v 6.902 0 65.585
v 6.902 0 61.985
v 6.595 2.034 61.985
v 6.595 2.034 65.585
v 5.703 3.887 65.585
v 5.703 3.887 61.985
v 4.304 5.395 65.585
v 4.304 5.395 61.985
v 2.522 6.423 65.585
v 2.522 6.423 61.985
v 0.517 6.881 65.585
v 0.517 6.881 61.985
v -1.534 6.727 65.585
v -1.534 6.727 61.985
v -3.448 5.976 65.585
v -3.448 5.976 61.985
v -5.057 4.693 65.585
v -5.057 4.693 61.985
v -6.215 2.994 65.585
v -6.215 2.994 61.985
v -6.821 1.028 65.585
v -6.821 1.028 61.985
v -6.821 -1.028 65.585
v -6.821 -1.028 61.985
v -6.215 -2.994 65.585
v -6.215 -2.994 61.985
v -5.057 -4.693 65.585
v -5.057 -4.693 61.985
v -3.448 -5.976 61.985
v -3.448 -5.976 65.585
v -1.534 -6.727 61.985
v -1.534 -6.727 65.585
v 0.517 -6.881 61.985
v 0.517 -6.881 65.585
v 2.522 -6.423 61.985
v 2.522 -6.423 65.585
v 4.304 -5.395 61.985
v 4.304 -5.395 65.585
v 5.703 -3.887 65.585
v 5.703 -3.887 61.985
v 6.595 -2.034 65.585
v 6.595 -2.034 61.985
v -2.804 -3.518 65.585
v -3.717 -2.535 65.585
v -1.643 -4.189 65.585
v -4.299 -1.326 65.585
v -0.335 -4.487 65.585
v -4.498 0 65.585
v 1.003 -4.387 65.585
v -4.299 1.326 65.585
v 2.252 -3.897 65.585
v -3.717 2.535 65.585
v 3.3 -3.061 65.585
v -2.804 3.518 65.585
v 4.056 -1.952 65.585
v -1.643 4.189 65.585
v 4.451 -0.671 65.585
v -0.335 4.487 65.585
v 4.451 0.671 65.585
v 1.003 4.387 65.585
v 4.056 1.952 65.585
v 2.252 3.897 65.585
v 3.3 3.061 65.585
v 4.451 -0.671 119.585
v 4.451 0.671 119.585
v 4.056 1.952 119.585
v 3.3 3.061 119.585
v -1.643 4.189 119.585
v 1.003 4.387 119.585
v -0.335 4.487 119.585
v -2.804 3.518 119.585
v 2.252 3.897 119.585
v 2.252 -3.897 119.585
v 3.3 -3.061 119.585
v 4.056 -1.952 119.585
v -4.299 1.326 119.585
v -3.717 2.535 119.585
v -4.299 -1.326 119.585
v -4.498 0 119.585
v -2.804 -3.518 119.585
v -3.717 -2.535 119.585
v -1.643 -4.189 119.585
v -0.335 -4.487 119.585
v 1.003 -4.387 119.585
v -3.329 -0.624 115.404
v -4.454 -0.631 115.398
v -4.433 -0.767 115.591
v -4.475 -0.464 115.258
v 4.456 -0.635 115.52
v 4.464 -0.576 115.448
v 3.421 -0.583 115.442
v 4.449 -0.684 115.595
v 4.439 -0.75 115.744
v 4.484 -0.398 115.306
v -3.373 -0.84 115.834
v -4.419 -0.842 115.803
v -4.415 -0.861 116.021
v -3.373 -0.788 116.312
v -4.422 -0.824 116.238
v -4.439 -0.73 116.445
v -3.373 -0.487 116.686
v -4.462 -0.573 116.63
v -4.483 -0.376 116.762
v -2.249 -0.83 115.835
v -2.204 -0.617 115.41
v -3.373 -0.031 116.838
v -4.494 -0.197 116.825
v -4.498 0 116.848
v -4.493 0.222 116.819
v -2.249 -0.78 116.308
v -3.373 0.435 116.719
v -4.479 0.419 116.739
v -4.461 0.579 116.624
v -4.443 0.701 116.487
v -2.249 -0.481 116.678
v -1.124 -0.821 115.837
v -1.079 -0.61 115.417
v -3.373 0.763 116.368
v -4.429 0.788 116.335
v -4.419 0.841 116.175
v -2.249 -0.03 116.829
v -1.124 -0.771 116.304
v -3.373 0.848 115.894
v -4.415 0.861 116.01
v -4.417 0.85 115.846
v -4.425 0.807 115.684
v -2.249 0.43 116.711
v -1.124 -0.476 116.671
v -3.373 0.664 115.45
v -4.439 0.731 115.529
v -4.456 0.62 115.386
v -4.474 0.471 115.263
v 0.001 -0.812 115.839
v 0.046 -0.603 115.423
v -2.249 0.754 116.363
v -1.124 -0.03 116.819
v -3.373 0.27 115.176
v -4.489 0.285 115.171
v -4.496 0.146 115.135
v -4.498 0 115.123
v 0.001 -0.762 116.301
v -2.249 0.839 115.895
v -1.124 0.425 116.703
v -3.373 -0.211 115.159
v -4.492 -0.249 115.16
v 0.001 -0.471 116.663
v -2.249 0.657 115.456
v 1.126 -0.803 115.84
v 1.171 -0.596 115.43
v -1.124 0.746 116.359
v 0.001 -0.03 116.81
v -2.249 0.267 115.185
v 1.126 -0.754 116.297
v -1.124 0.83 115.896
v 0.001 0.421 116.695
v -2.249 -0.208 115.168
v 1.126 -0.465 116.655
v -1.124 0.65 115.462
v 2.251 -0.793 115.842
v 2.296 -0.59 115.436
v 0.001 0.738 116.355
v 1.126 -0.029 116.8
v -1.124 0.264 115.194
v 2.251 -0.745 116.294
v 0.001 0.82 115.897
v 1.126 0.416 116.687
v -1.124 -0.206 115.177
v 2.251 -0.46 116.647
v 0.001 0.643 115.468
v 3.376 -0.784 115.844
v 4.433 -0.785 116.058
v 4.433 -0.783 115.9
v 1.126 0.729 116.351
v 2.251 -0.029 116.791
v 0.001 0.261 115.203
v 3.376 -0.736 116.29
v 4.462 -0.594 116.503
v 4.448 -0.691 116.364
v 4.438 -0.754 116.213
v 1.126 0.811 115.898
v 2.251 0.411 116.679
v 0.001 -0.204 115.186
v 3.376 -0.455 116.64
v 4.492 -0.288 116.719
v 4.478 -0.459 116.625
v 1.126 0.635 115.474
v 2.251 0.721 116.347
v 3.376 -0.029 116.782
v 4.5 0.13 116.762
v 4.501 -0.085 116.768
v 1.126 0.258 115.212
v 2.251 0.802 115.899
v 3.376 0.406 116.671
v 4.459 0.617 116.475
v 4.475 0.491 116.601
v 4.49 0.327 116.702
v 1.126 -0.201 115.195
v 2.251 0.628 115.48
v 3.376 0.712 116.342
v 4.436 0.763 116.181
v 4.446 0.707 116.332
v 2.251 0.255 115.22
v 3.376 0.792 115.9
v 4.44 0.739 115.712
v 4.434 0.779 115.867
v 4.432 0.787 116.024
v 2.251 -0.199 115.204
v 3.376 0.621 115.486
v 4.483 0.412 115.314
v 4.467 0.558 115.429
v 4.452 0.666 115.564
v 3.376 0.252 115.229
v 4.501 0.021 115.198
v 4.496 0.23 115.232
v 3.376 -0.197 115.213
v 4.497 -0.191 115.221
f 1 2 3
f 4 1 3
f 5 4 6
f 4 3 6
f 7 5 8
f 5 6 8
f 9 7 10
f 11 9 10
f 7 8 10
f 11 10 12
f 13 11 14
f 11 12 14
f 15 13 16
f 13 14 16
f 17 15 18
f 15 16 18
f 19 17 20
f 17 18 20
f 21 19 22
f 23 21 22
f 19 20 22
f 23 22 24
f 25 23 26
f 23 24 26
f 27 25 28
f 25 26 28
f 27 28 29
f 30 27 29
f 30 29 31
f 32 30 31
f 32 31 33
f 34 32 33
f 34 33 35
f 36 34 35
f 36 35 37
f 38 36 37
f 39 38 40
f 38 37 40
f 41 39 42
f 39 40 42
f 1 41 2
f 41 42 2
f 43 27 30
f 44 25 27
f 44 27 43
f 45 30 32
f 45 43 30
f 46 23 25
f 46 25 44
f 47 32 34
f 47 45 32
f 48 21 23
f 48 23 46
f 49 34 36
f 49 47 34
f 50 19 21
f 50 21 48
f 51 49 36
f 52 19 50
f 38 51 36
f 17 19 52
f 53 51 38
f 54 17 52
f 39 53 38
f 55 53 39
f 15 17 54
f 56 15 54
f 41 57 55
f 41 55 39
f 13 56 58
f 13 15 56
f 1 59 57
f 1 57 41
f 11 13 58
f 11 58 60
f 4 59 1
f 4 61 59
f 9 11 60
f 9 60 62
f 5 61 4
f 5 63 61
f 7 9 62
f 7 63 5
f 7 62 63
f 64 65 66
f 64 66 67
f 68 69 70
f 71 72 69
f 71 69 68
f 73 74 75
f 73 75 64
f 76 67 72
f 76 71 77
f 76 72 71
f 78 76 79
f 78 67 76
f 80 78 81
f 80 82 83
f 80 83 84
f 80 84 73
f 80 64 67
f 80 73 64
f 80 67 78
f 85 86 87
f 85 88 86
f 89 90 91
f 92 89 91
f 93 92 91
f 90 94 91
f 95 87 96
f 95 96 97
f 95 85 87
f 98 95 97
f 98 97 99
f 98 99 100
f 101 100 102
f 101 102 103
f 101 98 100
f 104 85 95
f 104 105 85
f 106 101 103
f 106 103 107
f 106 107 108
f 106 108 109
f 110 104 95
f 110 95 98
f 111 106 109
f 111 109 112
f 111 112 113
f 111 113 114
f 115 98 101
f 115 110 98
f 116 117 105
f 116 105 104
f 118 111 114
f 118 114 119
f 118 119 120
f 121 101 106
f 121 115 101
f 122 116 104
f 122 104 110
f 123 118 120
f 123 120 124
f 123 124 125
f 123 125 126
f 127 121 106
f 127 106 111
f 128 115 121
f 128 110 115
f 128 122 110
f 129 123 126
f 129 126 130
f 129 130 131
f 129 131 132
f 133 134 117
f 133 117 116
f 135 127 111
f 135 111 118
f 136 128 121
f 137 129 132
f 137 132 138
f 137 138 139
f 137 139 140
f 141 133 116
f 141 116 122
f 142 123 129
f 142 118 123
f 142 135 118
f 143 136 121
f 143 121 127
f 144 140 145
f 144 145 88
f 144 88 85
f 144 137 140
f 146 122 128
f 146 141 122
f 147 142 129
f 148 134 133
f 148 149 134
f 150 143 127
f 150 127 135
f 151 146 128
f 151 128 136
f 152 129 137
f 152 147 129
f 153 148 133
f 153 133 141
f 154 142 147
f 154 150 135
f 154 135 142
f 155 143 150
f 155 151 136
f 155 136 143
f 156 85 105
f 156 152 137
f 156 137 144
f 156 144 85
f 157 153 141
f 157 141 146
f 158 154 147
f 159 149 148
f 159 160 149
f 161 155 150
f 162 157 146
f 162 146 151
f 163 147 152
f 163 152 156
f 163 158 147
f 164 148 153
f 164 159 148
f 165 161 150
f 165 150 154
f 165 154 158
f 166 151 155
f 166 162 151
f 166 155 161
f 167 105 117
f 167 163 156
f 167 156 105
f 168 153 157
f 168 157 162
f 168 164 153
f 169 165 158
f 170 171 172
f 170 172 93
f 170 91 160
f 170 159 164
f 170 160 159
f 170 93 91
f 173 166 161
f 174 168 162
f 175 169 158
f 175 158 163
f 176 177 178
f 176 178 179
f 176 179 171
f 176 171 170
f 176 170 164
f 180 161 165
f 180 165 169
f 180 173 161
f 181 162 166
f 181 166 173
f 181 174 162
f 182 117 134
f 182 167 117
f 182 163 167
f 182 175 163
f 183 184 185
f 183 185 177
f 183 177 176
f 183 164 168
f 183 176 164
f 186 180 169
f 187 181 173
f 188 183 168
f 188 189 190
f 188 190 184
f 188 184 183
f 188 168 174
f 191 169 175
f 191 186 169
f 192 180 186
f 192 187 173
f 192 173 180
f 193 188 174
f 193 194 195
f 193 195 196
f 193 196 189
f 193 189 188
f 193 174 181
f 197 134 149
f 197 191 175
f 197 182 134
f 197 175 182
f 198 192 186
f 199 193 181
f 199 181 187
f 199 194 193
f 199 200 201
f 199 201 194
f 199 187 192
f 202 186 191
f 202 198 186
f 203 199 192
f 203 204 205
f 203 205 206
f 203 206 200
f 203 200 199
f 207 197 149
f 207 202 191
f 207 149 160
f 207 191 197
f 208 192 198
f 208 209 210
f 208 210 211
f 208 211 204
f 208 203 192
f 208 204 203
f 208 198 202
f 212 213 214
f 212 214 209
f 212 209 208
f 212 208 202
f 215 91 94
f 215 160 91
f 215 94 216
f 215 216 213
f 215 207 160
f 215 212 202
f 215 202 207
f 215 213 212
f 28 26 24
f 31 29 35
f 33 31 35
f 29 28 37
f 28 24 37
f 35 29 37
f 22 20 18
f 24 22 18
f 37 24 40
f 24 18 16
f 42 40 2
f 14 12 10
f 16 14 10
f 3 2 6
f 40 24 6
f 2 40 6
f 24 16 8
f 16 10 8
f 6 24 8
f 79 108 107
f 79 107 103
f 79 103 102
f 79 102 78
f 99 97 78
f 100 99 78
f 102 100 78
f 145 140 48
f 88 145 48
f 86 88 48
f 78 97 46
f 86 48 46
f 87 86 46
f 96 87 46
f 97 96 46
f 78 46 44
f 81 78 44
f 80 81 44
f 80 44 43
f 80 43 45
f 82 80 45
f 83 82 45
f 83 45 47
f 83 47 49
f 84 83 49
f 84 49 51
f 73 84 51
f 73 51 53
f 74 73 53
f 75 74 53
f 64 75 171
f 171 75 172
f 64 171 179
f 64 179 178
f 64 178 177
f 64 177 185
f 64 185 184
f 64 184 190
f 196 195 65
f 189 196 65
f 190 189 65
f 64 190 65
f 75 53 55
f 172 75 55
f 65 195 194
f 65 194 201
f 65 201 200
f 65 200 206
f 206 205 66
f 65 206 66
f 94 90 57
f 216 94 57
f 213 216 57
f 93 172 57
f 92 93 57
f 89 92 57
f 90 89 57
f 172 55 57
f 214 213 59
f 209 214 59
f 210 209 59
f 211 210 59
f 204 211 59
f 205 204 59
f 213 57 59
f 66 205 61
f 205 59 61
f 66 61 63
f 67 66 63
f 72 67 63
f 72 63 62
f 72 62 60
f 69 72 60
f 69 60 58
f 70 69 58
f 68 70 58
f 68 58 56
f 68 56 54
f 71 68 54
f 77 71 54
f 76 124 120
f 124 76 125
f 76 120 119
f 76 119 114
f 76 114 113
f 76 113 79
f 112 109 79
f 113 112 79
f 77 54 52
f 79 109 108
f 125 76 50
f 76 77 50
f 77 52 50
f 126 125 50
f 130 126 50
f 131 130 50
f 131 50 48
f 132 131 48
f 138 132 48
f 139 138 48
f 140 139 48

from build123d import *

# Parameters (mm, degrees)
SKETCH2_R           = 23
BOSS_EXTRUDE1_DEPTH = 12
SKETCH3_R           = 15
BOSS_EXTRUDE2_DEPTH = 180
SCALE1_SCALE        = 0.3


with BuildPart() as part:
    # Sketch2 → Boss-Extrude1 (new body)
    with BuildSketch(Plane.XY):
        Circle(SKETCH2_R)
    extrude(amount=BOSS_EXTRUDE1_DEPTH)

    # Sketch3 → Boss-Extrude2 (add)
    with BuildSketch(Plane.XY.offset(12)):
        with Locations(Location((0, 0, 0), (0, 0, 180))):
            Circle(SKETCH3_R)
    extrude(amount=BOSS_EXTRUDE2_DEPTH)

    # Sketch4 → Cut-Revolve1 (revolve, cut)
    with BuildSketch(Plane.XY.offset(180), mode=Mode.PRIVATE) as cut_revolve1_sk:
        Polygon((-30, 0), (-30, 3), (30, 2.5), (30, 0), align=None)
    revolve(cut_revolve1_sk.sketch.rotate(Axis((30, 0, 180), (-1, 0, 0)), 137.024045149), axis=Axis((30, 0, 180), (-1, 0, 0)), mode=Mode.SUBTRACT)


with BuildPart() as part_1:
    # Scale1: scaled about (0.002156445, -4e-08, 88.550522263)
    add(part.part.scale(SCALE1_SCALE).moved(Location((0.001509511, -2.8e-08, 61.985365584))))


solid = part_1.part
